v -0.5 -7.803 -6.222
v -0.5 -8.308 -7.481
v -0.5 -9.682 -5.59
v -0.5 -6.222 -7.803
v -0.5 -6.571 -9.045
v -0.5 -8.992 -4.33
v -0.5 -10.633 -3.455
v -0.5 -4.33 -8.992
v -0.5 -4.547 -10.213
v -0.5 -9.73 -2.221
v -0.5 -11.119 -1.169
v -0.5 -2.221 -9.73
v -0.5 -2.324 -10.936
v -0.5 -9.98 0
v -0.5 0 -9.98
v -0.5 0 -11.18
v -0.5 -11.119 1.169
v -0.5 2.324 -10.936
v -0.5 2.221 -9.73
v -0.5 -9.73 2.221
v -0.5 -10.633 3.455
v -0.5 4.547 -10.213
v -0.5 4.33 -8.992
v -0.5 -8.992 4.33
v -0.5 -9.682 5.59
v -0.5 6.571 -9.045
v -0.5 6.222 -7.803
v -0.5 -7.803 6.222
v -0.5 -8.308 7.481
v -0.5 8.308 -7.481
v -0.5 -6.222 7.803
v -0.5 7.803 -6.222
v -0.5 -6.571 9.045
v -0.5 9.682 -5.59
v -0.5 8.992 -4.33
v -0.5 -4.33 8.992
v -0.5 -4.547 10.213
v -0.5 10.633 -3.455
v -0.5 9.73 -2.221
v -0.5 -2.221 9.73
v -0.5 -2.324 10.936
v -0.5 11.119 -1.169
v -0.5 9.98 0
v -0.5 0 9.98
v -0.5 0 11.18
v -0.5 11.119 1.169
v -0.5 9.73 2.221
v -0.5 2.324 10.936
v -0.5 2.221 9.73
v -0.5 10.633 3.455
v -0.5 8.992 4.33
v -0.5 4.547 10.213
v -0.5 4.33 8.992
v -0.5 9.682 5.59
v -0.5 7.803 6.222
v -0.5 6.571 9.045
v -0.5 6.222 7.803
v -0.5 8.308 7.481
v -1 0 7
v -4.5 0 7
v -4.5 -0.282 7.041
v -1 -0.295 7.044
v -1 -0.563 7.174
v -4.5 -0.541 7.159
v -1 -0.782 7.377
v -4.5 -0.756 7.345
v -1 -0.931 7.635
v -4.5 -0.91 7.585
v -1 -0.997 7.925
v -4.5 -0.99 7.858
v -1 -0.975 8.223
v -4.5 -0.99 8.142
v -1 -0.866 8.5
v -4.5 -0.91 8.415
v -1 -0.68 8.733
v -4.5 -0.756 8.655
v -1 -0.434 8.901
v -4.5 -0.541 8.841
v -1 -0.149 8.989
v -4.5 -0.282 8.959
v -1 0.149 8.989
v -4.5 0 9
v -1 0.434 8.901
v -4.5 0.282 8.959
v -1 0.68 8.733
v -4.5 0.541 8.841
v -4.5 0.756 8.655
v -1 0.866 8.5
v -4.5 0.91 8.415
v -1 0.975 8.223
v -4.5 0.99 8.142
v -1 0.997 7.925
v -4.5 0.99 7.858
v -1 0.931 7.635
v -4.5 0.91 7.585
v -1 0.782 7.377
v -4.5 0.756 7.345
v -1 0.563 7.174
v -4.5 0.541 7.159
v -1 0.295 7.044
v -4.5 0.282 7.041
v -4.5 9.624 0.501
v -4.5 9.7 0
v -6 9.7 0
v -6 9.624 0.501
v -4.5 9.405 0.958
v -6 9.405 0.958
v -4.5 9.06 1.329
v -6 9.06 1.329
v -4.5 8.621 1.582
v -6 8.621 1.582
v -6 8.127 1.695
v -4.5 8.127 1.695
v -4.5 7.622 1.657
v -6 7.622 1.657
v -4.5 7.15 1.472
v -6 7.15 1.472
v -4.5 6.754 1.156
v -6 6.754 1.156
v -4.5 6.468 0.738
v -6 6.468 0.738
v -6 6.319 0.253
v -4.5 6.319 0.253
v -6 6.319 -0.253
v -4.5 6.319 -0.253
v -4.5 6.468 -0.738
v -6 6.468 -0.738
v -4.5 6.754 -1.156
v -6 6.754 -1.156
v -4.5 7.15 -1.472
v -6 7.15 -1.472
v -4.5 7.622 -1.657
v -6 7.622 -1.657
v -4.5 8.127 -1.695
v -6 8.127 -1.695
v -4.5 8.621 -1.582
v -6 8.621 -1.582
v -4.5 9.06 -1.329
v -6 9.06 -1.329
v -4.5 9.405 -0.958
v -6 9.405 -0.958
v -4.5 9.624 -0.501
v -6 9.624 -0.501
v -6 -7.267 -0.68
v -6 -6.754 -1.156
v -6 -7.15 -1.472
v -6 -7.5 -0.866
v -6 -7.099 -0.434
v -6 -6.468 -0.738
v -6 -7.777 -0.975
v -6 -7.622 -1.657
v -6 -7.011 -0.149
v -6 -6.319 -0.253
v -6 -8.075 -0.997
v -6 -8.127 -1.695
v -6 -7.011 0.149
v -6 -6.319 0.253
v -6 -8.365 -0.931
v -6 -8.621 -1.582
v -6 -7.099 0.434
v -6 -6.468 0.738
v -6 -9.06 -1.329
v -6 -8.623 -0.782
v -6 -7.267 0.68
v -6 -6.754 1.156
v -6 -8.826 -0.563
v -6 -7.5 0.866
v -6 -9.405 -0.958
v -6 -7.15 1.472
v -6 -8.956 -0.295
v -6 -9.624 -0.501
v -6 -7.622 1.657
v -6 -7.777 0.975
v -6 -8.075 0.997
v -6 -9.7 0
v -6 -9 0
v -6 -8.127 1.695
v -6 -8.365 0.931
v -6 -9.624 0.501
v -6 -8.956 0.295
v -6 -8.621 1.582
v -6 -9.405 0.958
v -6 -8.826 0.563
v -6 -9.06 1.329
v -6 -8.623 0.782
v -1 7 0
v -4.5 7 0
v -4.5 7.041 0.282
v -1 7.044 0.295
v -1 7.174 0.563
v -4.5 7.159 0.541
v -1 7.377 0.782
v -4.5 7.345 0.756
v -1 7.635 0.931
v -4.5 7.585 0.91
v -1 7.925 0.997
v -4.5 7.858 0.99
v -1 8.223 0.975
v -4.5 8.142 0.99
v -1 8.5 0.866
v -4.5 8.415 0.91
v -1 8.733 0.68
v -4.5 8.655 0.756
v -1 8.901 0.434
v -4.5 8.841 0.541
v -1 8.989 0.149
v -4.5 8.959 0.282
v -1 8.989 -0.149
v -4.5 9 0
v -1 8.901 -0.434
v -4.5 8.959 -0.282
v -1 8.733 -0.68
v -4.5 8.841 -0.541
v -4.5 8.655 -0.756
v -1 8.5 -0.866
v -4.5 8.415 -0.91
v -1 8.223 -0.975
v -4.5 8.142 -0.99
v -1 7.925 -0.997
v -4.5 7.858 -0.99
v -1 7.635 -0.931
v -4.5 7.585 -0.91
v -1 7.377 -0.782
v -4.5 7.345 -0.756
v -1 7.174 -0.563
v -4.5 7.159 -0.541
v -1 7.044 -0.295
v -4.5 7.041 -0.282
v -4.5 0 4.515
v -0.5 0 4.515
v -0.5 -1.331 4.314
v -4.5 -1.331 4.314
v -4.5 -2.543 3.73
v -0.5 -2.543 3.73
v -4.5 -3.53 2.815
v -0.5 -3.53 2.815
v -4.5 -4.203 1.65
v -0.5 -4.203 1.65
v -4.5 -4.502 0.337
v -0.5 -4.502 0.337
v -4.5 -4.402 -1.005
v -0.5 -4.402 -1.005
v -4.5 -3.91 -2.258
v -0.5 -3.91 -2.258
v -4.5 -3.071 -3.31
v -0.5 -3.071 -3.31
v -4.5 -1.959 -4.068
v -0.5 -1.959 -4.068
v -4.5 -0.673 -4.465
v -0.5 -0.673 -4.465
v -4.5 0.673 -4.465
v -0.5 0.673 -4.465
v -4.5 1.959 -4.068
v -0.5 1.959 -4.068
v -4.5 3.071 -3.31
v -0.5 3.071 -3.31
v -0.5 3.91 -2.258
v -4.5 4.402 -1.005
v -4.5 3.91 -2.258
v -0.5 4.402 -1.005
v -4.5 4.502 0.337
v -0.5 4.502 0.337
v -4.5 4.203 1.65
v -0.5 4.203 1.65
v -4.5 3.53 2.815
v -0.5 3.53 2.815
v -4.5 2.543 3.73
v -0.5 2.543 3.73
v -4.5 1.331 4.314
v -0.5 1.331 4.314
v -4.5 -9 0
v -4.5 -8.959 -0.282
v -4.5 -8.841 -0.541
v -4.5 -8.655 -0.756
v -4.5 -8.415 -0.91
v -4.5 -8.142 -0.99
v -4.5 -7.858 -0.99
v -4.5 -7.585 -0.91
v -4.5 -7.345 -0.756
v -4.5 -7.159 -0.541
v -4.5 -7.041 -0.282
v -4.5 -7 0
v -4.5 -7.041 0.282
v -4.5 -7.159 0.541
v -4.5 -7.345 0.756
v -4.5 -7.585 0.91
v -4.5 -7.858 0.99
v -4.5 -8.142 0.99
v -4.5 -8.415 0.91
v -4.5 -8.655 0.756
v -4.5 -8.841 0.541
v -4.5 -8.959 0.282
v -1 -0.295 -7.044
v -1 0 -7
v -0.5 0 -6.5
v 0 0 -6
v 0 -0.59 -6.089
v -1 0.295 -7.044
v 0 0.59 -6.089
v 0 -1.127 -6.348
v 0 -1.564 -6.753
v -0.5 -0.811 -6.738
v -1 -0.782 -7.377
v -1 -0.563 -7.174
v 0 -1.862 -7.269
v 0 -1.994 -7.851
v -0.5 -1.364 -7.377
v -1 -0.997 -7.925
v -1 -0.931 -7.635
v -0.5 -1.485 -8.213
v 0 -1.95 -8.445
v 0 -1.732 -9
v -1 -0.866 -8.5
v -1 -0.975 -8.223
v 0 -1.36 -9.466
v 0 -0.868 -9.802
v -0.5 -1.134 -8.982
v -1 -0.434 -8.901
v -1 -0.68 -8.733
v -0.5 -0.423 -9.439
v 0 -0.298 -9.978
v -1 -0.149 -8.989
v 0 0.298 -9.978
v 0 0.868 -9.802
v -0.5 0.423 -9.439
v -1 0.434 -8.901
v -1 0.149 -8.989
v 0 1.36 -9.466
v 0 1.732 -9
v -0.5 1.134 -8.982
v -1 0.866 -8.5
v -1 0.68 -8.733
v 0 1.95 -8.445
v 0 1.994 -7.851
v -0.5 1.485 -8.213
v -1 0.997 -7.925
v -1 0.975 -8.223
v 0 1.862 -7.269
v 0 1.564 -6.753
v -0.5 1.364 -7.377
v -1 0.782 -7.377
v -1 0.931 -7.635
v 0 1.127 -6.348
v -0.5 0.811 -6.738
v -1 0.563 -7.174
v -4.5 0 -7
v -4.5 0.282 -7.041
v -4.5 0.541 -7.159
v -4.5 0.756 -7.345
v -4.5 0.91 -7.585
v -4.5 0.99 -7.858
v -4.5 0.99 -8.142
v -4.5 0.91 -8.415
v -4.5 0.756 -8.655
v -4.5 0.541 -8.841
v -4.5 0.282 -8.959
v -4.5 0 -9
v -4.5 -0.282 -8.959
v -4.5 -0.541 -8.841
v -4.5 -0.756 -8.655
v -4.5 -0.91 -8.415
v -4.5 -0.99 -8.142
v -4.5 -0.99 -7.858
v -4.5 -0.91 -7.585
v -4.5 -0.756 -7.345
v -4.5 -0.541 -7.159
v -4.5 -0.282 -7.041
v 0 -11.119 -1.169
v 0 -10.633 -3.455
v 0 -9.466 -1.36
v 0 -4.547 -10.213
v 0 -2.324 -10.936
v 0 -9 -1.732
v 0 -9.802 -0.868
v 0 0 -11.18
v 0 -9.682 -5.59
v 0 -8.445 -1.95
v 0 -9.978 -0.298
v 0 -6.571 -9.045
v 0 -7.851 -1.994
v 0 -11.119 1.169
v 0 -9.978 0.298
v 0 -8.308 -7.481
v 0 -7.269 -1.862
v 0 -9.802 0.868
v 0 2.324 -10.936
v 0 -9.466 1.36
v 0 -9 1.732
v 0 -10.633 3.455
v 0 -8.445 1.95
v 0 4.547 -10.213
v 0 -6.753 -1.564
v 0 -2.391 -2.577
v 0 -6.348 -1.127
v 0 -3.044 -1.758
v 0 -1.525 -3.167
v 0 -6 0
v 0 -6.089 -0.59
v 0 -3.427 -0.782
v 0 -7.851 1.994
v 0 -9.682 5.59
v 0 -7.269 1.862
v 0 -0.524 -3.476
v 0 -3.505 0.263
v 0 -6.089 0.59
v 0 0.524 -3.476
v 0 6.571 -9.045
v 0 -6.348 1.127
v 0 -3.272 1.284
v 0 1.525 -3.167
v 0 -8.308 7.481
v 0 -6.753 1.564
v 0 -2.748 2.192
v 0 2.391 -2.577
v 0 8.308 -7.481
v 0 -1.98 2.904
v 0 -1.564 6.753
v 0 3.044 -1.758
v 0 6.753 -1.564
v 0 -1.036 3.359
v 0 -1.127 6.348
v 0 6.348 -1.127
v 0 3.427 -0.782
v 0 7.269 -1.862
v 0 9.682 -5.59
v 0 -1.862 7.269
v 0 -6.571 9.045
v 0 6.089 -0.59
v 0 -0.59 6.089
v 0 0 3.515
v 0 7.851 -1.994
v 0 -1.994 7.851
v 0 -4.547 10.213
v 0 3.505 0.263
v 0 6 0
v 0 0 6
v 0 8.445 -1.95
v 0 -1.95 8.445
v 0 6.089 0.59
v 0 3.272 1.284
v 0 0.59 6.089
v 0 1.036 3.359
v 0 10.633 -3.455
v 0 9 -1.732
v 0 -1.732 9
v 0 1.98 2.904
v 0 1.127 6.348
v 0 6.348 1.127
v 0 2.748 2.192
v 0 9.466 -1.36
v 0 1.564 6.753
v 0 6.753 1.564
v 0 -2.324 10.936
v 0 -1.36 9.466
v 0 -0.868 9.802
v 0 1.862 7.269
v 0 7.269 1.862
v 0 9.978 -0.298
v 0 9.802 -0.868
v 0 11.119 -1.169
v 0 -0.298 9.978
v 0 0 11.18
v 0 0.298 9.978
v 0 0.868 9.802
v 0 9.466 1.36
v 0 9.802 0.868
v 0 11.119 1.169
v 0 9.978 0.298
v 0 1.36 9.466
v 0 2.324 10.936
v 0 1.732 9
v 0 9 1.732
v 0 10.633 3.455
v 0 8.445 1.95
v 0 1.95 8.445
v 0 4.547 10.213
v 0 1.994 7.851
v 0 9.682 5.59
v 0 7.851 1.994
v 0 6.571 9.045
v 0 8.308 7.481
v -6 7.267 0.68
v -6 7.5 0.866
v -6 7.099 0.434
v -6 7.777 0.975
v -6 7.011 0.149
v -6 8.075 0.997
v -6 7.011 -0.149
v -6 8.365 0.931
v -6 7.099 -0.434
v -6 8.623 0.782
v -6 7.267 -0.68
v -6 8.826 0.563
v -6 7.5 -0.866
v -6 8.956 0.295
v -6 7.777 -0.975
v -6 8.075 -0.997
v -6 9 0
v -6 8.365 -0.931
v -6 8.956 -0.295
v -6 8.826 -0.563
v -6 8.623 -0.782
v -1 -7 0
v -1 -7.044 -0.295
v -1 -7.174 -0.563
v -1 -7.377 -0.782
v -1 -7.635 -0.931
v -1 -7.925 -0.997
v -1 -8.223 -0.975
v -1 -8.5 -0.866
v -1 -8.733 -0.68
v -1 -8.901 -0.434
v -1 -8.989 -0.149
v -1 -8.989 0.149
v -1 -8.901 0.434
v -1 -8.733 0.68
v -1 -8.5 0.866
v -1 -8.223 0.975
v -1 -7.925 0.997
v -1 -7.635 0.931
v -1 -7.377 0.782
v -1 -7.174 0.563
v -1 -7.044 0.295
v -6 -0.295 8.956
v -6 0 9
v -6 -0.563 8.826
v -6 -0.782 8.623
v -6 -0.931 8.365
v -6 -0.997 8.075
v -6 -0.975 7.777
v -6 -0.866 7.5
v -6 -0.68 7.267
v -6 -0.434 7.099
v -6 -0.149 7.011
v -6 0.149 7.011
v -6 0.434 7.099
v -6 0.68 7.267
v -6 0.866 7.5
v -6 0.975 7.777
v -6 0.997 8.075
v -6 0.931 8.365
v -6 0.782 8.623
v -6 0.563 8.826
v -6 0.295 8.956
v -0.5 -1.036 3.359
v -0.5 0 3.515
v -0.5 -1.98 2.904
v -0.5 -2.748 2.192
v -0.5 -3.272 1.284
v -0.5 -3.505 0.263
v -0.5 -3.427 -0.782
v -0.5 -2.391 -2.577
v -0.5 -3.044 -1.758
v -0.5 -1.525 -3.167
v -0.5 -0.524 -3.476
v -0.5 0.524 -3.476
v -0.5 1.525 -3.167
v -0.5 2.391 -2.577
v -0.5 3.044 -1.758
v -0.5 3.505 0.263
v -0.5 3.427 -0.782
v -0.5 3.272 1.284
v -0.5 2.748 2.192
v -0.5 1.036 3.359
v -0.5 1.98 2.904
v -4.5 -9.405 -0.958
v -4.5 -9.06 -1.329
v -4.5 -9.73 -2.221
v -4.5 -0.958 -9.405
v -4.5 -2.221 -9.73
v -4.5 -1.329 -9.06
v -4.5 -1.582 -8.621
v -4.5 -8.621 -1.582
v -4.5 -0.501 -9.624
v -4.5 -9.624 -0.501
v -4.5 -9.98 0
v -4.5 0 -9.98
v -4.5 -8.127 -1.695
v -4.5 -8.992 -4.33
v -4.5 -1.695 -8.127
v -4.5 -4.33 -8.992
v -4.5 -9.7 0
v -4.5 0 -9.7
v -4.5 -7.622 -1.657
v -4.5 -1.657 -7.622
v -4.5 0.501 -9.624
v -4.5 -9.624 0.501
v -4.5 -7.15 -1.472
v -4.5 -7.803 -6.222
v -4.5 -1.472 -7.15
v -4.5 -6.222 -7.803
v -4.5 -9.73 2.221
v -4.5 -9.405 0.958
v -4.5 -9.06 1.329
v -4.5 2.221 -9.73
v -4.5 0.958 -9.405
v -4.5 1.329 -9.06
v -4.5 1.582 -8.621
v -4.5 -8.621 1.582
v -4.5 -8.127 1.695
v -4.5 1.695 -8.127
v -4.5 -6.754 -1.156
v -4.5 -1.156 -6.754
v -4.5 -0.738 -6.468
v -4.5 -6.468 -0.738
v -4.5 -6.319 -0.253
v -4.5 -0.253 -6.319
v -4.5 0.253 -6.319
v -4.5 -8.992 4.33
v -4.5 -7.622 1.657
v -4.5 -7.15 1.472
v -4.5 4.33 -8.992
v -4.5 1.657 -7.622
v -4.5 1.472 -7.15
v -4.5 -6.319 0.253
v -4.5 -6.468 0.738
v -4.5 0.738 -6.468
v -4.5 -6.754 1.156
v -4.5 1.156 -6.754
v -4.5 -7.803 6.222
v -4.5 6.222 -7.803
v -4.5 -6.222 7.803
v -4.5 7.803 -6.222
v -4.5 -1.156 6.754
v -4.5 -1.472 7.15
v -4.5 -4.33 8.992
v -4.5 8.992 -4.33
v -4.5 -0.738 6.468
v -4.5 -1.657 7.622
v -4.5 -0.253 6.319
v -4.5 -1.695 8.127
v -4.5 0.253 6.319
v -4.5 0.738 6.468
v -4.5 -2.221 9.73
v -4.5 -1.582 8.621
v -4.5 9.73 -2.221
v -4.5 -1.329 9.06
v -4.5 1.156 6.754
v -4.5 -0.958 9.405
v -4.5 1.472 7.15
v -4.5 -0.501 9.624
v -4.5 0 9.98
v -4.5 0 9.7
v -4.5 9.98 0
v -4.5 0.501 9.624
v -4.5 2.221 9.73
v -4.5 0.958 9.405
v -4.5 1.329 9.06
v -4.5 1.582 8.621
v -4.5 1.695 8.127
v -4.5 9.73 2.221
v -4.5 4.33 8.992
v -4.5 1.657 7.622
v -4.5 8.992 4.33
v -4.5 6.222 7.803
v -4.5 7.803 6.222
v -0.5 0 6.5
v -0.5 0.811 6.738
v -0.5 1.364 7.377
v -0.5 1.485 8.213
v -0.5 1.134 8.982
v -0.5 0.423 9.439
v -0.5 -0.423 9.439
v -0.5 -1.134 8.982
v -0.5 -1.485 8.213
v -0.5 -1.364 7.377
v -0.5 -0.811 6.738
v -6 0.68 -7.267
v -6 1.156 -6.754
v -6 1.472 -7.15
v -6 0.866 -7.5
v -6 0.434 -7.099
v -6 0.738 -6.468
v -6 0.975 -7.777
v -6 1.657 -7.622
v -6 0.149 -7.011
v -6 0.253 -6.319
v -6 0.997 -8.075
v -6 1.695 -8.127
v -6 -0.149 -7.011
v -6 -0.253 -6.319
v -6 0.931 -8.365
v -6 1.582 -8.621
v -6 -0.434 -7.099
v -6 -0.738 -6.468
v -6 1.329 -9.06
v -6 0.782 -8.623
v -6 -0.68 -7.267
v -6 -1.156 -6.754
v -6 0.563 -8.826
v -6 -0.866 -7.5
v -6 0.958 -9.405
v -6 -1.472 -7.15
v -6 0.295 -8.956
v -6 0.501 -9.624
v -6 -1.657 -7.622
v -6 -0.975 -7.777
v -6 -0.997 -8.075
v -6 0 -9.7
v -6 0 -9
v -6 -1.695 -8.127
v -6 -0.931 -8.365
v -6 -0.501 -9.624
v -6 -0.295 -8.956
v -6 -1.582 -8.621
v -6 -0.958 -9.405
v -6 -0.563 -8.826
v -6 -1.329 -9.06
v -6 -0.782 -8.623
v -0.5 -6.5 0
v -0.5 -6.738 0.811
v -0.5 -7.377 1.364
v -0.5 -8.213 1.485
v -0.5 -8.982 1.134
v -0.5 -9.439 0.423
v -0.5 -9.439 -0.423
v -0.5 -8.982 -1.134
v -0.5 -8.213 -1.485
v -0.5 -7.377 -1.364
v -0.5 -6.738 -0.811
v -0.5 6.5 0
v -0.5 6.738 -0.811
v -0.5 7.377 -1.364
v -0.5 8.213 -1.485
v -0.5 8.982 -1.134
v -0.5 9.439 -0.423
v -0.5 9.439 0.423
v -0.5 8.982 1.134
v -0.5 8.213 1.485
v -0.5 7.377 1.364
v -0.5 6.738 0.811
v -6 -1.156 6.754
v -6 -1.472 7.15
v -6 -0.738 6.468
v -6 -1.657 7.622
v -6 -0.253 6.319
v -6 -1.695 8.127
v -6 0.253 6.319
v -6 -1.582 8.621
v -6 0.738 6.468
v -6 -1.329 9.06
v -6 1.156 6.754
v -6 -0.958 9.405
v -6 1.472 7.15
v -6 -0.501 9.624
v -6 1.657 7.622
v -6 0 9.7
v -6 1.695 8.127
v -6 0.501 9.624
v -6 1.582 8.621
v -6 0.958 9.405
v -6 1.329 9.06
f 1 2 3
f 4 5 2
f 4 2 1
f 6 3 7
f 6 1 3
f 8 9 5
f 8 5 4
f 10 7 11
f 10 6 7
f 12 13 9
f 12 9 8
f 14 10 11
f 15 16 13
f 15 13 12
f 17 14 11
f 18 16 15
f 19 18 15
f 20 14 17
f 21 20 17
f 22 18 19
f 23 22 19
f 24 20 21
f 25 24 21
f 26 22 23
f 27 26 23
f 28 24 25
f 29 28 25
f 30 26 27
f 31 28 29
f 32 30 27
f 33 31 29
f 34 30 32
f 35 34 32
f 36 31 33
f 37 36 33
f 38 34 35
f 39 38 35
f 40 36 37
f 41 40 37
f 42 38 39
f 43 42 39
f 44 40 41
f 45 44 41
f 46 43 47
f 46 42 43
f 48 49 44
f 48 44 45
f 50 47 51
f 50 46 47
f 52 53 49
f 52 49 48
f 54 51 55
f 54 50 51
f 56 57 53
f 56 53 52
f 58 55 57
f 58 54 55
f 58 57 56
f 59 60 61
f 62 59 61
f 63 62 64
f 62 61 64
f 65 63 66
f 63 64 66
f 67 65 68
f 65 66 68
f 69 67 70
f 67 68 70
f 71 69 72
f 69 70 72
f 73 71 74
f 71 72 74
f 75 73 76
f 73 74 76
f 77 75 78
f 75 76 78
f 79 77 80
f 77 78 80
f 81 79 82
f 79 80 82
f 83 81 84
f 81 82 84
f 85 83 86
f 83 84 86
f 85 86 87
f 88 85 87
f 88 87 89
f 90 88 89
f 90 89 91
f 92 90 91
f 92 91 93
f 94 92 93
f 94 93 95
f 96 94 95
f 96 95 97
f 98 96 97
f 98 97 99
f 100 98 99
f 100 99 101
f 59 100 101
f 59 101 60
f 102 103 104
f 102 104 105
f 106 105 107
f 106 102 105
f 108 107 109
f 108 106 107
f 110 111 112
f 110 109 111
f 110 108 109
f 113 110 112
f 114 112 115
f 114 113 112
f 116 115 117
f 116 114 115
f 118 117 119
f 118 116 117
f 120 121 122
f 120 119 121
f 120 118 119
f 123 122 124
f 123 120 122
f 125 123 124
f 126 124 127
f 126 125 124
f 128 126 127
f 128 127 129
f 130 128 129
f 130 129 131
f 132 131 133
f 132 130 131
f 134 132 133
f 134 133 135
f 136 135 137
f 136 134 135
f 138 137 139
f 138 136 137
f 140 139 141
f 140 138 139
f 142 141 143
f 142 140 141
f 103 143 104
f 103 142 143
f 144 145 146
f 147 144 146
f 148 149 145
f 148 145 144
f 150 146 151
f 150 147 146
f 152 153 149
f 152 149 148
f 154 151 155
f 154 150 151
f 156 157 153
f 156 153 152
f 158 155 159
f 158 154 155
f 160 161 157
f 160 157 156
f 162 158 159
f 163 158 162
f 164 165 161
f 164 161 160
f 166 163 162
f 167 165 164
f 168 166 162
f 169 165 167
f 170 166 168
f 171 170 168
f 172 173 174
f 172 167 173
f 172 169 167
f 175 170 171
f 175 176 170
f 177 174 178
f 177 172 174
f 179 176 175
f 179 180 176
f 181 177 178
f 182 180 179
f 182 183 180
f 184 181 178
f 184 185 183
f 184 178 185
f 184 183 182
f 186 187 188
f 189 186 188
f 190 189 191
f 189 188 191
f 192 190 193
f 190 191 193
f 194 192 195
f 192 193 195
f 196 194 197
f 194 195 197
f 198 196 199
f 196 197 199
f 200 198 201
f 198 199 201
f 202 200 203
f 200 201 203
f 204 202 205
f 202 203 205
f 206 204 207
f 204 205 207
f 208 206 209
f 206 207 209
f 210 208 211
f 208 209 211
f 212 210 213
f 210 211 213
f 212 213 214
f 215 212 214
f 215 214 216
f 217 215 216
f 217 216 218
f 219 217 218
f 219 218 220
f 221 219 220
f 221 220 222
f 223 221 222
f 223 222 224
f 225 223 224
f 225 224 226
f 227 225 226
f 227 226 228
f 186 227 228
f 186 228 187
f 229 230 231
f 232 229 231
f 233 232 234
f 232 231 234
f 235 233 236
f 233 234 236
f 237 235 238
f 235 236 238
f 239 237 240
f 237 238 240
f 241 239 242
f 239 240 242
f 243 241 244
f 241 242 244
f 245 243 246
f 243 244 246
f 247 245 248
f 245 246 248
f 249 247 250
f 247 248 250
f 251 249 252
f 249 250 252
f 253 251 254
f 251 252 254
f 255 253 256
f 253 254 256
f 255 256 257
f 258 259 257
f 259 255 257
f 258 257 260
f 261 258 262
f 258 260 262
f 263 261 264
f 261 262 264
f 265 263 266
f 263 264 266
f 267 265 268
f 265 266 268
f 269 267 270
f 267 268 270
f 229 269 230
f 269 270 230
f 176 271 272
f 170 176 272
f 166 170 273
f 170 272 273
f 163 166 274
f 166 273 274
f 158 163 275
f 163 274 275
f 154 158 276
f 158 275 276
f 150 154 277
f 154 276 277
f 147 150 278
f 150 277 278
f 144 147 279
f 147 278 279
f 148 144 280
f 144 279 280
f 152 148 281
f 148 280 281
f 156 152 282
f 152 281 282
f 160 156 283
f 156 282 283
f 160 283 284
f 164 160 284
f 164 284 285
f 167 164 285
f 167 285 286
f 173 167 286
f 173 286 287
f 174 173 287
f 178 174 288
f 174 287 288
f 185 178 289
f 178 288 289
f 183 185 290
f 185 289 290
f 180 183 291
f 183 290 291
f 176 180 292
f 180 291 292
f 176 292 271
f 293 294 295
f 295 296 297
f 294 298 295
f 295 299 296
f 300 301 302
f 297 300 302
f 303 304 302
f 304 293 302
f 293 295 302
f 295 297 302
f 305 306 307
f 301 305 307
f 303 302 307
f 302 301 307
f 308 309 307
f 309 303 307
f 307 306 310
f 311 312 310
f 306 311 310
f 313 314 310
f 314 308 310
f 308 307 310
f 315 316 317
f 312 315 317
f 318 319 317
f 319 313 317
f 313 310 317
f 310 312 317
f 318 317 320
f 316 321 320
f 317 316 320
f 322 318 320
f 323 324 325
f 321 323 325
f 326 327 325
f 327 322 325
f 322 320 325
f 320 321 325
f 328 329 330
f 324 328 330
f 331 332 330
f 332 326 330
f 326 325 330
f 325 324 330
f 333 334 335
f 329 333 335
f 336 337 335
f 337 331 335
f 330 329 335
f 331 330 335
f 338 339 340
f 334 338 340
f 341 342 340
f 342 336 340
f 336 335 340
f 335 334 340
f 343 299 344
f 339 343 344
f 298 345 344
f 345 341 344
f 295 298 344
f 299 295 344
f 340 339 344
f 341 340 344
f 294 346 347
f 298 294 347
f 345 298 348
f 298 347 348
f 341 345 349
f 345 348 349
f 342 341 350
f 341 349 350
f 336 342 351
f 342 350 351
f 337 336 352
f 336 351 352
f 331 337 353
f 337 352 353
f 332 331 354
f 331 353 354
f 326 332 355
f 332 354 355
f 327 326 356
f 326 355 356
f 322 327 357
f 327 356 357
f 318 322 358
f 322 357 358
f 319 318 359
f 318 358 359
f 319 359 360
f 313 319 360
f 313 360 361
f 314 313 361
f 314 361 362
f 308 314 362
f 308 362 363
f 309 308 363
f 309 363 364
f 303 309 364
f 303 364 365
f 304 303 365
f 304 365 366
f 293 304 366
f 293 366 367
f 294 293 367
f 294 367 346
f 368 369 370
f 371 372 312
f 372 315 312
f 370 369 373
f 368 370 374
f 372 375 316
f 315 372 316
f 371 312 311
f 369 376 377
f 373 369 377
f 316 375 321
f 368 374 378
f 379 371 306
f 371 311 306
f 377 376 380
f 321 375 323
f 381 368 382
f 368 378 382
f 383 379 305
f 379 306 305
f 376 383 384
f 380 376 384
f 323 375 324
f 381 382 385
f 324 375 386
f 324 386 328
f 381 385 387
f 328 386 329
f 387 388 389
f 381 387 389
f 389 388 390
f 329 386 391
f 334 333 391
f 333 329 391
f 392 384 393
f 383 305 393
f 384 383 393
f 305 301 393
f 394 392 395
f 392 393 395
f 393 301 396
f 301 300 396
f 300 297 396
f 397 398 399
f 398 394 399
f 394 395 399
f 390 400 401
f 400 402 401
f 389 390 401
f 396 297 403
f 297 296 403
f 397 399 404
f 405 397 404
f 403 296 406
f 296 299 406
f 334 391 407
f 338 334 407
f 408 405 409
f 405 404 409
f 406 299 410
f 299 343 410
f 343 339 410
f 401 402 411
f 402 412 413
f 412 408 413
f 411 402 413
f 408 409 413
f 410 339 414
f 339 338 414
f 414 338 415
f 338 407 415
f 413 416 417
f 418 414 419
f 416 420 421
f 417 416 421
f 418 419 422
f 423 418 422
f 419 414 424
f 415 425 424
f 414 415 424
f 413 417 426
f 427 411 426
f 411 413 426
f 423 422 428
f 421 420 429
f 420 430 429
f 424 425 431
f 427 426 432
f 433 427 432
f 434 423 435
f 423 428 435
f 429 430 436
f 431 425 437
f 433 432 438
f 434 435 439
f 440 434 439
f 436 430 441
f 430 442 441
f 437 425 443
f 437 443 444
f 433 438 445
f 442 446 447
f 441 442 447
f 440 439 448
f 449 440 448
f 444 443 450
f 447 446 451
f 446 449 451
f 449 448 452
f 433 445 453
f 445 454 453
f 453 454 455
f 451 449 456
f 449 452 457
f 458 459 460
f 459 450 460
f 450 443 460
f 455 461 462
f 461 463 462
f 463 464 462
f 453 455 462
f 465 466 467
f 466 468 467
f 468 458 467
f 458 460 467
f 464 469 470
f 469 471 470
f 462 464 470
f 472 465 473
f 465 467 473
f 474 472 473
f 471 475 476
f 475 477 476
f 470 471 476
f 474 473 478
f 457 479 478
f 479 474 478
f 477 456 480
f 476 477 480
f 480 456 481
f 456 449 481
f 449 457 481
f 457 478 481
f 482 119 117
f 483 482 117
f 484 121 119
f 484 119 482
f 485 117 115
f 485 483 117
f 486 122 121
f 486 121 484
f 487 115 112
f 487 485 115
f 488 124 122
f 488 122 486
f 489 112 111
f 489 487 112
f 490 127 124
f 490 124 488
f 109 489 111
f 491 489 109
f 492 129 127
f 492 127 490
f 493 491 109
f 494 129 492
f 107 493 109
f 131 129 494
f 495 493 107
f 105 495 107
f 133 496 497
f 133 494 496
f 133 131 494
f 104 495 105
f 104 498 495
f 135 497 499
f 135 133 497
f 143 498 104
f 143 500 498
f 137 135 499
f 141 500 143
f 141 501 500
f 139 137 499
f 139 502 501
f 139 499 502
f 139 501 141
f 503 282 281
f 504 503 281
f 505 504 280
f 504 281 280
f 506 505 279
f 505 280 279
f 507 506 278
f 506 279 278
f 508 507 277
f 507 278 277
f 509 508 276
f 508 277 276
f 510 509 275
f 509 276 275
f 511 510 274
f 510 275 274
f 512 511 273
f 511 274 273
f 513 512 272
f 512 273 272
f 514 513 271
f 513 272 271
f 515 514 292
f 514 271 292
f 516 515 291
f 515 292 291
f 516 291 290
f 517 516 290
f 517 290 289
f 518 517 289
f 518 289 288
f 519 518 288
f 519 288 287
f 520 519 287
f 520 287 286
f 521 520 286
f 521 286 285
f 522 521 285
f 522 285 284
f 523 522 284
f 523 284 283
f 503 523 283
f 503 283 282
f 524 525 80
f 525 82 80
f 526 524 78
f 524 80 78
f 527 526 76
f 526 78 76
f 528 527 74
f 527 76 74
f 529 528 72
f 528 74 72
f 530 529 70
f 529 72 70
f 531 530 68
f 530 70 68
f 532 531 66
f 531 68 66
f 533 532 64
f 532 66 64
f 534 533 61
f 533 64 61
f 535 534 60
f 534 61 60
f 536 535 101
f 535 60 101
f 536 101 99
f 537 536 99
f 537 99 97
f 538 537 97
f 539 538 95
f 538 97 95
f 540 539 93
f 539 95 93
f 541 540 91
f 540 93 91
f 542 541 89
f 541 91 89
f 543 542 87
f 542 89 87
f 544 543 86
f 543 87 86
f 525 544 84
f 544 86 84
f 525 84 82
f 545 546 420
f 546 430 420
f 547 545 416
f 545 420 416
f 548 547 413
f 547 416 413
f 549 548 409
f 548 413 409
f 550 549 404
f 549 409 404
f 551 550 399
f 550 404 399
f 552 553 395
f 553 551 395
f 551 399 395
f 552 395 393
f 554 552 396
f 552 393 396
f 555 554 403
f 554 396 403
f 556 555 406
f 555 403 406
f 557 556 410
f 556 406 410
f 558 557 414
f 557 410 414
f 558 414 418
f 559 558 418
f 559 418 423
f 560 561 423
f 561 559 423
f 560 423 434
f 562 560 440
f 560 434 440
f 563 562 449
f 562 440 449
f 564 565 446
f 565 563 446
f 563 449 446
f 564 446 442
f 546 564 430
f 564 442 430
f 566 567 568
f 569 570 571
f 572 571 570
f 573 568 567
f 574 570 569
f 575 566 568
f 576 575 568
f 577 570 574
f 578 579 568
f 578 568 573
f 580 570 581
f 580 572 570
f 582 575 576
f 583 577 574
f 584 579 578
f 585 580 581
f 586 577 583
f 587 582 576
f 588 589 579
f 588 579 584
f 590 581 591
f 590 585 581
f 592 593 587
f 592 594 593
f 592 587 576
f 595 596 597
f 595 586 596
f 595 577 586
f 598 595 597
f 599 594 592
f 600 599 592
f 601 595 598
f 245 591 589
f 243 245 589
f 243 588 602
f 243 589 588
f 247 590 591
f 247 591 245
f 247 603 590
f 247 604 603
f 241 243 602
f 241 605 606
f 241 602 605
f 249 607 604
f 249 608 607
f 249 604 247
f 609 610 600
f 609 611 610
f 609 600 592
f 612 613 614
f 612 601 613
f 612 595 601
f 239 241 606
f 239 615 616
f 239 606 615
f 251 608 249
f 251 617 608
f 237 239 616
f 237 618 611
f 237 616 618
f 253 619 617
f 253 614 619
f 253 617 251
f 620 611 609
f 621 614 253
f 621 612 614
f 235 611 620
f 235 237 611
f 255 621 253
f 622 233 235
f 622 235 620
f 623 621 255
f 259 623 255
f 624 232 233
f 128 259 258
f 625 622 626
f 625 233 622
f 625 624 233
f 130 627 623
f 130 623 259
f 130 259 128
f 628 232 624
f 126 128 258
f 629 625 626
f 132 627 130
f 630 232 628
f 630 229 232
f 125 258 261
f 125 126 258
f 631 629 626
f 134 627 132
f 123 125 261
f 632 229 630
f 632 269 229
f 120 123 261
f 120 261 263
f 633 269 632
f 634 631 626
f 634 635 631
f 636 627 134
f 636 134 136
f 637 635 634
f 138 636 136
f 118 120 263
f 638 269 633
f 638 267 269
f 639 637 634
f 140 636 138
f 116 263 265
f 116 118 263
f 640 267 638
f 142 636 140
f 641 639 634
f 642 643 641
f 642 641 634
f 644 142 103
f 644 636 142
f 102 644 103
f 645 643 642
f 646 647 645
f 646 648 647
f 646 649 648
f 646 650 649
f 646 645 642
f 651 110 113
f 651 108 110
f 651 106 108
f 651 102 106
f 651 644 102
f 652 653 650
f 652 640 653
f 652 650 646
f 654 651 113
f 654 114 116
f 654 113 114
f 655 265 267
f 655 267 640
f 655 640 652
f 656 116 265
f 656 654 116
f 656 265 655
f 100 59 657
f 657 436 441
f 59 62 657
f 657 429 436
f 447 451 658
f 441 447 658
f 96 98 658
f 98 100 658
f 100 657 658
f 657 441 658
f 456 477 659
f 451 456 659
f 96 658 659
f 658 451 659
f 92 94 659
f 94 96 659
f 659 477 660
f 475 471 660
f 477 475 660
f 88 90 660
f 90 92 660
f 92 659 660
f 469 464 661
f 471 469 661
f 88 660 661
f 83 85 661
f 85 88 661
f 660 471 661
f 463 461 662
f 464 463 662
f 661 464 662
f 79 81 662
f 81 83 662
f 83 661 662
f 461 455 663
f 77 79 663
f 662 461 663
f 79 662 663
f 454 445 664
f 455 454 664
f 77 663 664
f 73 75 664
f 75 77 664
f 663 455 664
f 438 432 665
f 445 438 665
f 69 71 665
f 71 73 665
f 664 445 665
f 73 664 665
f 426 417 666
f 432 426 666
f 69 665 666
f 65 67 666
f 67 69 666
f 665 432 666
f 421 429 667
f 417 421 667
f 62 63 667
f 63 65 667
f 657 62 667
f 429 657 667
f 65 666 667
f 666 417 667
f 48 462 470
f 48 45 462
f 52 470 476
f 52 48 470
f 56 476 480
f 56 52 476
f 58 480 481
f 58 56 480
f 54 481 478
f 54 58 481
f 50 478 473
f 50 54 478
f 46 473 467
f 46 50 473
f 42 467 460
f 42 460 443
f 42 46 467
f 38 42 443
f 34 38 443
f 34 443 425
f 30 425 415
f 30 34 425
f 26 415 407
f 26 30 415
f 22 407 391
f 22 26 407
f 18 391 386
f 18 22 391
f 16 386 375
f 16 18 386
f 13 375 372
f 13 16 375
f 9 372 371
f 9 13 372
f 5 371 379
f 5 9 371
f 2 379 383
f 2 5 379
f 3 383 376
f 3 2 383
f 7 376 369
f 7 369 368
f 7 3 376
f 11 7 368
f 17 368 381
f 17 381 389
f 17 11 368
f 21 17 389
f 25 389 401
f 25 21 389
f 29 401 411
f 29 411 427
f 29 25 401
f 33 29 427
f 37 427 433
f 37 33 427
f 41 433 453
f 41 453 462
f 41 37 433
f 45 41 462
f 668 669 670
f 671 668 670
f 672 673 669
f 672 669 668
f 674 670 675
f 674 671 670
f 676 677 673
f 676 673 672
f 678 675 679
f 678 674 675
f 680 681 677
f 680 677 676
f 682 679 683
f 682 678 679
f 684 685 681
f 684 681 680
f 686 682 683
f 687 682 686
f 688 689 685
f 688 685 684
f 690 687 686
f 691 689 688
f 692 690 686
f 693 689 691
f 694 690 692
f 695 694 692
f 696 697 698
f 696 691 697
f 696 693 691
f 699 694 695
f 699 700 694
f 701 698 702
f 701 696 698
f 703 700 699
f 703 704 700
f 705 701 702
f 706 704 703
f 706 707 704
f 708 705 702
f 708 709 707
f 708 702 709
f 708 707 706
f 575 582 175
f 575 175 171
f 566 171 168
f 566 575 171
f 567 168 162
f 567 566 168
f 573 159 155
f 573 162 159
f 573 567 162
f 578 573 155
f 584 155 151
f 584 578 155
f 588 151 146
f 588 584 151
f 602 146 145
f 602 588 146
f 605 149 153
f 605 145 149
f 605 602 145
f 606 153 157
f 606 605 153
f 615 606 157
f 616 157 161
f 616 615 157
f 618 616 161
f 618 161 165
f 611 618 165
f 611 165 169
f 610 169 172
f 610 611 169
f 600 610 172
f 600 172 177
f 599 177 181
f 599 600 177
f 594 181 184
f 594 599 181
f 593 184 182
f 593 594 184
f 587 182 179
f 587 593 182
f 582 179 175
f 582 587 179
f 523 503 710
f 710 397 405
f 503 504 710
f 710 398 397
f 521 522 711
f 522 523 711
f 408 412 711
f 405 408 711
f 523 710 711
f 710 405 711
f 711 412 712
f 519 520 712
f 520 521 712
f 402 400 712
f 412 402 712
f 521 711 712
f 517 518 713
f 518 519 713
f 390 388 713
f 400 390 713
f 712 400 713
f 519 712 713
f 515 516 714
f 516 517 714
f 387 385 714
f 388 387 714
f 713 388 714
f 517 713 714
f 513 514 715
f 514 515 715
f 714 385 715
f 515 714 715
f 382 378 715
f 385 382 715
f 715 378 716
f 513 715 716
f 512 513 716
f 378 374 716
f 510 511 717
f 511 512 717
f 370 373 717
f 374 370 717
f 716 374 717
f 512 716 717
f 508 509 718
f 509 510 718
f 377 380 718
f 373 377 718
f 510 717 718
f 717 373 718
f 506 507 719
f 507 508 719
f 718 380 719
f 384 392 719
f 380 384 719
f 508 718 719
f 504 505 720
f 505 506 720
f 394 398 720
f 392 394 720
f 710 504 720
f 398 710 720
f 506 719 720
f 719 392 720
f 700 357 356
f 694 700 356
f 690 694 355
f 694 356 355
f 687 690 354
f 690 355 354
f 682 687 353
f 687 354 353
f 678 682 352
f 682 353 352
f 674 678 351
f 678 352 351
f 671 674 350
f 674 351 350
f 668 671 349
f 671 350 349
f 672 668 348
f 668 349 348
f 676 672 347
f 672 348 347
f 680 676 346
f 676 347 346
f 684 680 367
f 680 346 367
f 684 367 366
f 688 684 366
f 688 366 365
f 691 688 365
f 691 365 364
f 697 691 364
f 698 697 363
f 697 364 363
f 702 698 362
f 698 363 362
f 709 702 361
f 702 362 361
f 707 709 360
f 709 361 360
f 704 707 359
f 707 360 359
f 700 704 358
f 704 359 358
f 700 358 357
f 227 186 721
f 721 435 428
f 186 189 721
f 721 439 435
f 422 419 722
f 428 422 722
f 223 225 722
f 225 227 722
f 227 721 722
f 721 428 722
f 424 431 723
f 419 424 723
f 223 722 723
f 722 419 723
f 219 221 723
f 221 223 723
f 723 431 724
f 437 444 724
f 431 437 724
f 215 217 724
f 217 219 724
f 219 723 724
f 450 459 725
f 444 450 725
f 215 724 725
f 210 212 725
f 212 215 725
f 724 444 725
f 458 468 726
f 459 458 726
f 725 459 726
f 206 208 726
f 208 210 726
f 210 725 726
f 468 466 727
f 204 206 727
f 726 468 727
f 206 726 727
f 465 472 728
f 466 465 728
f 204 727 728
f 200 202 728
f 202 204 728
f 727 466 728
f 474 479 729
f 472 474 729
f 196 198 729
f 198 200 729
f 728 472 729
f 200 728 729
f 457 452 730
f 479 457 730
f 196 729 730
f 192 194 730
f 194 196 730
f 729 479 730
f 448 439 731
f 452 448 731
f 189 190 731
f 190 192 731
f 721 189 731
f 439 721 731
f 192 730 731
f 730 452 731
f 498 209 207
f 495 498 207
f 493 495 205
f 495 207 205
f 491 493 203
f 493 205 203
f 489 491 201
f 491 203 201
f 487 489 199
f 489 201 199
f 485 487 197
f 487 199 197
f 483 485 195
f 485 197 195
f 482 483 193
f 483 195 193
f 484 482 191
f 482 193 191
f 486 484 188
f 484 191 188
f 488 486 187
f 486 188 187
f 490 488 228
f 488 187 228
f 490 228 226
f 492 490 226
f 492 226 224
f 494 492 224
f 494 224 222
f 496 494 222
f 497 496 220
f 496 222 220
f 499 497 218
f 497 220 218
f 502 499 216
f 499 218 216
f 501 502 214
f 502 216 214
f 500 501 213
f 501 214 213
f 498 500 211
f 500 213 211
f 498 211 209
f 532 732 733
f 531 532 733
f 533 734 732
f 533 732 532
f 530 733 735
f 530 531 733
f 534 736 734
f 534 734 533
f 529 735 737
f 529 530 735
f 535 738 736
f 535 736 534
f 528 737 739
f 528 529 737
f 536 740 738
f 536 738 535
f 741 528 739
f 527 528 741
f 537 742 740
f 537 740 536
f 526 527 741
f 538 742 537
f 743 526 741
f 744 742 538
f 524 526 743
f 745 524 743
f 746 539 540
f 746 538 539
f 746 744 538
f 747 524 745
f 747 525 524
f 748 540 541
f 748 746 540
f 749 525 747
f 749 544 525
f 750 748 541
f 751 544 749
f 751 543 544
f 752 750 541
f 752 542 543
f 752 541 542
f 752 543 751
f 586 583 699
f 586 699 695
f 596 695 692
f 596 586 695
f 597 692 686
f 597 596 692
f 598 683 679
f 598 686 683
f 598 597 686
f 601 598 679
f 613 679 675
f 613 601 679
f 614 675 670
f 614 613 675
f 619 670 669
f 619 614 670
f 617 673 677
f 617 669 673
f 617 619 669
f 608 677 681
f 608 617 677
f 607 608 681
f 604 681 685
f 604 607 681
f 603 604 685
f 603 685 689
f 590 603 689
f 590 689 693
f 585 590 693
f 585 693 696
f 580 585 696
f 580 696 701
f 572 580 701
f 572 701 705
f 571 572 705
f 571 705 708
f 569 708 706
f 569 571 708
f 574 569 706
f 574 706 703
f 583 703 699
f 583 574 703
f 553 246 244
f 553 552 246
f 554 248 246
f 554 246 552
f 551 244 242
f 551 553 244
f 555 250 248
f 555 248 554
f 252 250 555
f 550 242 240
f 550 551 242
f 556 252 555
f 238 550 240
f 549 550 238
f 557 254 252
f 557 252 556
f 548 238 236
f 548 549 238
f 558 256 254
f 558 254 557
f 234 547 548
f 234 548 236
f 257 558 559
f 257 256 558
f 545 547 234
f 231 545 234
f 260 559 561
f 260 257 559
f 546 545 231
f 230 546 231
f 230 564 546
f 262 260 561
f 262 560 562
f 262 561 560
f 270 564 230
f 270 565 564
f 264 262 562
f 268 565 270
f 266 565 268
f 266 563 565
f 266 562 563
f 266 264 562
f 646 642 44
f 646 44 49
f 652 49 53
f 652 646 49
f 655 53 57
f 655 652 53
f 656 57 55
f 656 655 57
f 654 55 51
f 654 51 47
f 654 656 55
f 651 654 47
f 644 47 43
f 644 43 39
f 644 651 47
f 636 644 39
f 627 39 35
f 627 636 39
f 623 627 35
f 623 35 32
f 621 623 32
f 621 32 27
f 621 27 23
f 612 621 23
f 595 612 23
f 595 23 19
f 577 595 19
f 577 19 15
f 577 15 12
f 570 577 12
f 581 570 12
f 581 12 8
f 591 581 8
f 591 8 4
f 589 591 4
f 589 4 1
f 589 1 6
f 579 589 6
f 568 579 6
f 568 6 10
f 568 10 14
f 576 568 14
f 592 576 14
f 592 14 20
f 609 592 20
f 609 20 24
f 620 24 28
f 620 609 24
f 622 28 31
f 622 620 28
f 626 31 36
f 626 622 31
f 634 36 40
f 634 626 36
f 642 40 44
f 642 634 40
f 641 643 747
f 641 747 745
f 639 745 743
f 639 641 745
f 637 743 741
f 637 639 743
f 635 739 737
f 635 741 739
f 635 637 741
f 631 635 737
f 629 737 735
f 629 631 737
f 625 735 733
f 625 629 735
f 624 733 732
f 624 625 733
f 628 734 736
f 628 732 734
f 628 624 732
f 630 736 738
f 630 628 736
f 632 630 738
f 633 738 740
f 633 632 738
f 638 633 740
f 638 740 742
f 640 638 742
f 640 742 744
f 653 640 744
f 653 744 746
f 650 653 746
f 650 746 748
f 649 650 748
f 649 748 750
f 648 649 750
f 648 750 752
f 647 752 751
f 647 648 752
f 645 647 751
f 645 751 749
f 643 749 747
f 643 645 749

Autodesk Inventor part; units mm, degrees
ref_plane "YZ Plane" through (0, 0, 0) normal (1, 0, 0) x (0, 1, 0)
ref_plane "XZ Plane" through (0, 0, 0) normal (0, 1, 0) x (-1, 0, 0)
ref_plane "XY Plane" through (0, 0, 0) normal (0, 0, 1) x (1, 0, 0)
sketch "Skizze1" plane through (0, 0, 0) normal (0, 1, 0) x (-1, 0, 0)
  line L0 (0, 11.18) -> (0.5, 11.18)
  line L1 (0.5, 11.18) -> (0.5, 9.98)
  line L2 (0.5, 9.98) -> (4.5, 9.98)
  line L3 (4.5, 9.98) -> (4.5, 4.515)
  line L4 (4.5, 4.515) -> (0.5, 4.515)
  line L5 (0.5, 4.515) -> (0.5, 3.515)
  line L6 (0.5, 3.515) -> (0, 3.515)
  line L7 (0, 3.515) -> (0, 11.18)
  line L8 (0, 0) -> (7.49, 0)
  dimension "d1" = 9.03
  dimension "d2" = 1
  dimension "d3" = 4
  dimension "d5" = 19.96
  dimension "d6" = 1.2
  dimension "d7" = 4
  dimension "d9" = 0.5
revolve "Umdrehung1" add sketch "Skizze1" angle 360 about axis through (0, 0, 0) along (-1, 0, 0)
sketch "Skizze2" plane through (0, 0, 0) normal (1, 0, 0) x (0, 0, -1)
  line L0 (-15.652, 0) -> (15.652, 0) projected
  point P0 (0, 0)
  point P1 (-8, 0)
  dimension "d11" = 8
hole "Bohrung1" at (0, 0, 8) direction (-1, 0, 0) diameter 2 depth 5 tip angle 118 countersink diameter 4 countersink angle 90
sketch "Skizze4" plane through (-4.5, 0, 0) normal (-1, 0, 0) x (0, 0, 1)
  circle A0 centre (8, 0) radius 1 projected
  circle A1 centre (8, 0) radius 1.7
  point P0 (0, 0)
  dimension "d22" = 3.4
extrude "Extrusion1" add sketch "Skizze4" along normal blind 1.5
pattern_circular "Runde Anordnung1" count 4 over 360 about axis through (-10, 0, 0) along (1, 0, 0) of "Bohrung1", "Extrusion1"
properties part number "Getriebe Abdeckung" material "Aluminium 6061"
